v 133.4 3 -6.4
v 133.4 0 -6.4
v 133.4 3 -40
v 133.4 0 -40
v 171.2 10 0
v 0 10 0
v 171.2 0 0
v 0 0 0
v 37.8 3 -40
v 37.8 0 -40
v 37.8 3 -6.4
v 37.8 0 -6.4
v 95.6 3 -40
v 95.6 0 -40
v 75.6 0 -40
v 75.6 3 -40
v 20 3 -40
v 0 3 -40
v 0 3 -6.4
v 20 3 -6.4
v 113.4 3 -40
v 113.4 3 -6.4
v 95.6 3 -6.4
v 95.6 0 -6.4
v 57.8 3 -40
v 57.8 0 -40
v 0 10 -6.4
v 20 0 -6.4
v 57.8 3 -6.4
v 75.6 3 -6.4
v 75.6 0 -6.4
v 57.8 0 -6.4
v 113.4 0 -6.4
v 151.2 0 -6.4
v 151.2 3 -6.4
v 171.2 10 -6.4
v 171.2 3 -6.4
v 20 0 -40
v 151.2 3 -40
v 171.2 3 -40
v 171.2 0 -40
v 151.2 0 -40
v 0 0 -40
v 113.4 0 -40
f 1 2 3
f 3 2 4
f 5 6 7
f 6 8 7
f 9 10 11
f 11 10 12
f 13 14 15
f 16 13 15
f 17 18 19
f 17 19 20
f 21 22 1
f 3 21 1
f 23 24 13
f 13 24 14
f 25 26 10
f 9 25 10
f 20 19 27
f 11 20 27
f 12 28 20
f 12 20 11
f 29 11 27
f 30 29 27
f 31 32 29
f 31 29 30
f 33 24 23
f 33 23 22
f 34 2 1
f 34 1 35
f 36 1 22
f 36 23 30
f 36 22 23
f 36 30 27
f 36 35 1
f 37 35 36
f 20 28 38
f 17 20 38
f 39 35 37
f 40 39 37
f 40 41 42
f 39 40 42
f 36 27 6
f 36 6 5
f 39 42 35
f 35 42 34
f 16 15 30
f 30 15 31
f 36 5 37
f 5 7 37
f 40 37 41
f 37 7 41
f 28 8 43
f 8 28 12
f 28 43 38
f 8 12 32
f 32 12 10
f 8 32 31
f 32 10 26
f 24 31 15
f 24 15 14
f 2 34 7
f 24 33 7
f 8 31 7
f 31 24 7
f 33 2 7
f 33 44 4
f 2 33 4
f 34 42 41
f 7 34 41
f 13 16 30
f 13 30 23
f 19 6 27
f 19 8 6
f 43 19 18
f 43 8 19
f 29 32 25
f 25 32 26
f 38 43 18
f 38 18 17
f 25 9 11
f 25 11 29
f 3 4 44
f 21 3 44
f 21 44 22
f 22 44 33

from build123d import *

# Parameters (mm, degrees)
SKIZZE1_W                       = 20
SKIZZE1_H                       = 33.6
AUFSATZ_LINEAR_AUSTRAGEN1_DEPTH = 3
SKIZZE3_W                       = 171.2
SKIZZE3_H                       = 6.4
AUFSATZ_LINEAR_AUSTRAGEN2_DEPTH = 7


with BuildPart() as part:
    # Skizze1 → Aufsatz-Linear austragen1 (new body)
    with BuildSketch(Plane(origin=(0, 0, 0), x_dir=(1, 0, 0), z_dir=(0, 1, 0))):
        with Locations((10, 23.2)):
            Rectangle(SKIZZE1_W, SKIZZE1_H)
        Polygon((0, 6.4), (0, 0), (171.2, 0), (171.2, 40), (151.2, 40), (151.2, 6.4), (133.4, 6.4), (133.4, 40), (113.4, 40), (113.4, 6.4), (95.6, 6.4), (95.6, 40), (75.6, 40), (75.6, 6.4), (57.8, 6.4), (57.8, 40), (37.8, 40), (37.8, 6.4), (20, 6.4), align=None)
    extrude(amount=AUFSATZ_LINEAR_AUSTRAGEN1_DEPTH)

    # Skizze3 → Aufsatz-Linear austragen2 (add)
    with BuildSketch(Plane(origin=(0, 3, 0), x_dir=(1, 0, 0), z_dir=(0, 1, 0))):
        with Locations((85.6, 3.2)):
            Rectangle(SKIZZE3_W, SKIZZE3_H)
    extrude(amount=AUFSATZ_LINEAR_AUSTRAGEN2_DEPTH)


solid = part.part
